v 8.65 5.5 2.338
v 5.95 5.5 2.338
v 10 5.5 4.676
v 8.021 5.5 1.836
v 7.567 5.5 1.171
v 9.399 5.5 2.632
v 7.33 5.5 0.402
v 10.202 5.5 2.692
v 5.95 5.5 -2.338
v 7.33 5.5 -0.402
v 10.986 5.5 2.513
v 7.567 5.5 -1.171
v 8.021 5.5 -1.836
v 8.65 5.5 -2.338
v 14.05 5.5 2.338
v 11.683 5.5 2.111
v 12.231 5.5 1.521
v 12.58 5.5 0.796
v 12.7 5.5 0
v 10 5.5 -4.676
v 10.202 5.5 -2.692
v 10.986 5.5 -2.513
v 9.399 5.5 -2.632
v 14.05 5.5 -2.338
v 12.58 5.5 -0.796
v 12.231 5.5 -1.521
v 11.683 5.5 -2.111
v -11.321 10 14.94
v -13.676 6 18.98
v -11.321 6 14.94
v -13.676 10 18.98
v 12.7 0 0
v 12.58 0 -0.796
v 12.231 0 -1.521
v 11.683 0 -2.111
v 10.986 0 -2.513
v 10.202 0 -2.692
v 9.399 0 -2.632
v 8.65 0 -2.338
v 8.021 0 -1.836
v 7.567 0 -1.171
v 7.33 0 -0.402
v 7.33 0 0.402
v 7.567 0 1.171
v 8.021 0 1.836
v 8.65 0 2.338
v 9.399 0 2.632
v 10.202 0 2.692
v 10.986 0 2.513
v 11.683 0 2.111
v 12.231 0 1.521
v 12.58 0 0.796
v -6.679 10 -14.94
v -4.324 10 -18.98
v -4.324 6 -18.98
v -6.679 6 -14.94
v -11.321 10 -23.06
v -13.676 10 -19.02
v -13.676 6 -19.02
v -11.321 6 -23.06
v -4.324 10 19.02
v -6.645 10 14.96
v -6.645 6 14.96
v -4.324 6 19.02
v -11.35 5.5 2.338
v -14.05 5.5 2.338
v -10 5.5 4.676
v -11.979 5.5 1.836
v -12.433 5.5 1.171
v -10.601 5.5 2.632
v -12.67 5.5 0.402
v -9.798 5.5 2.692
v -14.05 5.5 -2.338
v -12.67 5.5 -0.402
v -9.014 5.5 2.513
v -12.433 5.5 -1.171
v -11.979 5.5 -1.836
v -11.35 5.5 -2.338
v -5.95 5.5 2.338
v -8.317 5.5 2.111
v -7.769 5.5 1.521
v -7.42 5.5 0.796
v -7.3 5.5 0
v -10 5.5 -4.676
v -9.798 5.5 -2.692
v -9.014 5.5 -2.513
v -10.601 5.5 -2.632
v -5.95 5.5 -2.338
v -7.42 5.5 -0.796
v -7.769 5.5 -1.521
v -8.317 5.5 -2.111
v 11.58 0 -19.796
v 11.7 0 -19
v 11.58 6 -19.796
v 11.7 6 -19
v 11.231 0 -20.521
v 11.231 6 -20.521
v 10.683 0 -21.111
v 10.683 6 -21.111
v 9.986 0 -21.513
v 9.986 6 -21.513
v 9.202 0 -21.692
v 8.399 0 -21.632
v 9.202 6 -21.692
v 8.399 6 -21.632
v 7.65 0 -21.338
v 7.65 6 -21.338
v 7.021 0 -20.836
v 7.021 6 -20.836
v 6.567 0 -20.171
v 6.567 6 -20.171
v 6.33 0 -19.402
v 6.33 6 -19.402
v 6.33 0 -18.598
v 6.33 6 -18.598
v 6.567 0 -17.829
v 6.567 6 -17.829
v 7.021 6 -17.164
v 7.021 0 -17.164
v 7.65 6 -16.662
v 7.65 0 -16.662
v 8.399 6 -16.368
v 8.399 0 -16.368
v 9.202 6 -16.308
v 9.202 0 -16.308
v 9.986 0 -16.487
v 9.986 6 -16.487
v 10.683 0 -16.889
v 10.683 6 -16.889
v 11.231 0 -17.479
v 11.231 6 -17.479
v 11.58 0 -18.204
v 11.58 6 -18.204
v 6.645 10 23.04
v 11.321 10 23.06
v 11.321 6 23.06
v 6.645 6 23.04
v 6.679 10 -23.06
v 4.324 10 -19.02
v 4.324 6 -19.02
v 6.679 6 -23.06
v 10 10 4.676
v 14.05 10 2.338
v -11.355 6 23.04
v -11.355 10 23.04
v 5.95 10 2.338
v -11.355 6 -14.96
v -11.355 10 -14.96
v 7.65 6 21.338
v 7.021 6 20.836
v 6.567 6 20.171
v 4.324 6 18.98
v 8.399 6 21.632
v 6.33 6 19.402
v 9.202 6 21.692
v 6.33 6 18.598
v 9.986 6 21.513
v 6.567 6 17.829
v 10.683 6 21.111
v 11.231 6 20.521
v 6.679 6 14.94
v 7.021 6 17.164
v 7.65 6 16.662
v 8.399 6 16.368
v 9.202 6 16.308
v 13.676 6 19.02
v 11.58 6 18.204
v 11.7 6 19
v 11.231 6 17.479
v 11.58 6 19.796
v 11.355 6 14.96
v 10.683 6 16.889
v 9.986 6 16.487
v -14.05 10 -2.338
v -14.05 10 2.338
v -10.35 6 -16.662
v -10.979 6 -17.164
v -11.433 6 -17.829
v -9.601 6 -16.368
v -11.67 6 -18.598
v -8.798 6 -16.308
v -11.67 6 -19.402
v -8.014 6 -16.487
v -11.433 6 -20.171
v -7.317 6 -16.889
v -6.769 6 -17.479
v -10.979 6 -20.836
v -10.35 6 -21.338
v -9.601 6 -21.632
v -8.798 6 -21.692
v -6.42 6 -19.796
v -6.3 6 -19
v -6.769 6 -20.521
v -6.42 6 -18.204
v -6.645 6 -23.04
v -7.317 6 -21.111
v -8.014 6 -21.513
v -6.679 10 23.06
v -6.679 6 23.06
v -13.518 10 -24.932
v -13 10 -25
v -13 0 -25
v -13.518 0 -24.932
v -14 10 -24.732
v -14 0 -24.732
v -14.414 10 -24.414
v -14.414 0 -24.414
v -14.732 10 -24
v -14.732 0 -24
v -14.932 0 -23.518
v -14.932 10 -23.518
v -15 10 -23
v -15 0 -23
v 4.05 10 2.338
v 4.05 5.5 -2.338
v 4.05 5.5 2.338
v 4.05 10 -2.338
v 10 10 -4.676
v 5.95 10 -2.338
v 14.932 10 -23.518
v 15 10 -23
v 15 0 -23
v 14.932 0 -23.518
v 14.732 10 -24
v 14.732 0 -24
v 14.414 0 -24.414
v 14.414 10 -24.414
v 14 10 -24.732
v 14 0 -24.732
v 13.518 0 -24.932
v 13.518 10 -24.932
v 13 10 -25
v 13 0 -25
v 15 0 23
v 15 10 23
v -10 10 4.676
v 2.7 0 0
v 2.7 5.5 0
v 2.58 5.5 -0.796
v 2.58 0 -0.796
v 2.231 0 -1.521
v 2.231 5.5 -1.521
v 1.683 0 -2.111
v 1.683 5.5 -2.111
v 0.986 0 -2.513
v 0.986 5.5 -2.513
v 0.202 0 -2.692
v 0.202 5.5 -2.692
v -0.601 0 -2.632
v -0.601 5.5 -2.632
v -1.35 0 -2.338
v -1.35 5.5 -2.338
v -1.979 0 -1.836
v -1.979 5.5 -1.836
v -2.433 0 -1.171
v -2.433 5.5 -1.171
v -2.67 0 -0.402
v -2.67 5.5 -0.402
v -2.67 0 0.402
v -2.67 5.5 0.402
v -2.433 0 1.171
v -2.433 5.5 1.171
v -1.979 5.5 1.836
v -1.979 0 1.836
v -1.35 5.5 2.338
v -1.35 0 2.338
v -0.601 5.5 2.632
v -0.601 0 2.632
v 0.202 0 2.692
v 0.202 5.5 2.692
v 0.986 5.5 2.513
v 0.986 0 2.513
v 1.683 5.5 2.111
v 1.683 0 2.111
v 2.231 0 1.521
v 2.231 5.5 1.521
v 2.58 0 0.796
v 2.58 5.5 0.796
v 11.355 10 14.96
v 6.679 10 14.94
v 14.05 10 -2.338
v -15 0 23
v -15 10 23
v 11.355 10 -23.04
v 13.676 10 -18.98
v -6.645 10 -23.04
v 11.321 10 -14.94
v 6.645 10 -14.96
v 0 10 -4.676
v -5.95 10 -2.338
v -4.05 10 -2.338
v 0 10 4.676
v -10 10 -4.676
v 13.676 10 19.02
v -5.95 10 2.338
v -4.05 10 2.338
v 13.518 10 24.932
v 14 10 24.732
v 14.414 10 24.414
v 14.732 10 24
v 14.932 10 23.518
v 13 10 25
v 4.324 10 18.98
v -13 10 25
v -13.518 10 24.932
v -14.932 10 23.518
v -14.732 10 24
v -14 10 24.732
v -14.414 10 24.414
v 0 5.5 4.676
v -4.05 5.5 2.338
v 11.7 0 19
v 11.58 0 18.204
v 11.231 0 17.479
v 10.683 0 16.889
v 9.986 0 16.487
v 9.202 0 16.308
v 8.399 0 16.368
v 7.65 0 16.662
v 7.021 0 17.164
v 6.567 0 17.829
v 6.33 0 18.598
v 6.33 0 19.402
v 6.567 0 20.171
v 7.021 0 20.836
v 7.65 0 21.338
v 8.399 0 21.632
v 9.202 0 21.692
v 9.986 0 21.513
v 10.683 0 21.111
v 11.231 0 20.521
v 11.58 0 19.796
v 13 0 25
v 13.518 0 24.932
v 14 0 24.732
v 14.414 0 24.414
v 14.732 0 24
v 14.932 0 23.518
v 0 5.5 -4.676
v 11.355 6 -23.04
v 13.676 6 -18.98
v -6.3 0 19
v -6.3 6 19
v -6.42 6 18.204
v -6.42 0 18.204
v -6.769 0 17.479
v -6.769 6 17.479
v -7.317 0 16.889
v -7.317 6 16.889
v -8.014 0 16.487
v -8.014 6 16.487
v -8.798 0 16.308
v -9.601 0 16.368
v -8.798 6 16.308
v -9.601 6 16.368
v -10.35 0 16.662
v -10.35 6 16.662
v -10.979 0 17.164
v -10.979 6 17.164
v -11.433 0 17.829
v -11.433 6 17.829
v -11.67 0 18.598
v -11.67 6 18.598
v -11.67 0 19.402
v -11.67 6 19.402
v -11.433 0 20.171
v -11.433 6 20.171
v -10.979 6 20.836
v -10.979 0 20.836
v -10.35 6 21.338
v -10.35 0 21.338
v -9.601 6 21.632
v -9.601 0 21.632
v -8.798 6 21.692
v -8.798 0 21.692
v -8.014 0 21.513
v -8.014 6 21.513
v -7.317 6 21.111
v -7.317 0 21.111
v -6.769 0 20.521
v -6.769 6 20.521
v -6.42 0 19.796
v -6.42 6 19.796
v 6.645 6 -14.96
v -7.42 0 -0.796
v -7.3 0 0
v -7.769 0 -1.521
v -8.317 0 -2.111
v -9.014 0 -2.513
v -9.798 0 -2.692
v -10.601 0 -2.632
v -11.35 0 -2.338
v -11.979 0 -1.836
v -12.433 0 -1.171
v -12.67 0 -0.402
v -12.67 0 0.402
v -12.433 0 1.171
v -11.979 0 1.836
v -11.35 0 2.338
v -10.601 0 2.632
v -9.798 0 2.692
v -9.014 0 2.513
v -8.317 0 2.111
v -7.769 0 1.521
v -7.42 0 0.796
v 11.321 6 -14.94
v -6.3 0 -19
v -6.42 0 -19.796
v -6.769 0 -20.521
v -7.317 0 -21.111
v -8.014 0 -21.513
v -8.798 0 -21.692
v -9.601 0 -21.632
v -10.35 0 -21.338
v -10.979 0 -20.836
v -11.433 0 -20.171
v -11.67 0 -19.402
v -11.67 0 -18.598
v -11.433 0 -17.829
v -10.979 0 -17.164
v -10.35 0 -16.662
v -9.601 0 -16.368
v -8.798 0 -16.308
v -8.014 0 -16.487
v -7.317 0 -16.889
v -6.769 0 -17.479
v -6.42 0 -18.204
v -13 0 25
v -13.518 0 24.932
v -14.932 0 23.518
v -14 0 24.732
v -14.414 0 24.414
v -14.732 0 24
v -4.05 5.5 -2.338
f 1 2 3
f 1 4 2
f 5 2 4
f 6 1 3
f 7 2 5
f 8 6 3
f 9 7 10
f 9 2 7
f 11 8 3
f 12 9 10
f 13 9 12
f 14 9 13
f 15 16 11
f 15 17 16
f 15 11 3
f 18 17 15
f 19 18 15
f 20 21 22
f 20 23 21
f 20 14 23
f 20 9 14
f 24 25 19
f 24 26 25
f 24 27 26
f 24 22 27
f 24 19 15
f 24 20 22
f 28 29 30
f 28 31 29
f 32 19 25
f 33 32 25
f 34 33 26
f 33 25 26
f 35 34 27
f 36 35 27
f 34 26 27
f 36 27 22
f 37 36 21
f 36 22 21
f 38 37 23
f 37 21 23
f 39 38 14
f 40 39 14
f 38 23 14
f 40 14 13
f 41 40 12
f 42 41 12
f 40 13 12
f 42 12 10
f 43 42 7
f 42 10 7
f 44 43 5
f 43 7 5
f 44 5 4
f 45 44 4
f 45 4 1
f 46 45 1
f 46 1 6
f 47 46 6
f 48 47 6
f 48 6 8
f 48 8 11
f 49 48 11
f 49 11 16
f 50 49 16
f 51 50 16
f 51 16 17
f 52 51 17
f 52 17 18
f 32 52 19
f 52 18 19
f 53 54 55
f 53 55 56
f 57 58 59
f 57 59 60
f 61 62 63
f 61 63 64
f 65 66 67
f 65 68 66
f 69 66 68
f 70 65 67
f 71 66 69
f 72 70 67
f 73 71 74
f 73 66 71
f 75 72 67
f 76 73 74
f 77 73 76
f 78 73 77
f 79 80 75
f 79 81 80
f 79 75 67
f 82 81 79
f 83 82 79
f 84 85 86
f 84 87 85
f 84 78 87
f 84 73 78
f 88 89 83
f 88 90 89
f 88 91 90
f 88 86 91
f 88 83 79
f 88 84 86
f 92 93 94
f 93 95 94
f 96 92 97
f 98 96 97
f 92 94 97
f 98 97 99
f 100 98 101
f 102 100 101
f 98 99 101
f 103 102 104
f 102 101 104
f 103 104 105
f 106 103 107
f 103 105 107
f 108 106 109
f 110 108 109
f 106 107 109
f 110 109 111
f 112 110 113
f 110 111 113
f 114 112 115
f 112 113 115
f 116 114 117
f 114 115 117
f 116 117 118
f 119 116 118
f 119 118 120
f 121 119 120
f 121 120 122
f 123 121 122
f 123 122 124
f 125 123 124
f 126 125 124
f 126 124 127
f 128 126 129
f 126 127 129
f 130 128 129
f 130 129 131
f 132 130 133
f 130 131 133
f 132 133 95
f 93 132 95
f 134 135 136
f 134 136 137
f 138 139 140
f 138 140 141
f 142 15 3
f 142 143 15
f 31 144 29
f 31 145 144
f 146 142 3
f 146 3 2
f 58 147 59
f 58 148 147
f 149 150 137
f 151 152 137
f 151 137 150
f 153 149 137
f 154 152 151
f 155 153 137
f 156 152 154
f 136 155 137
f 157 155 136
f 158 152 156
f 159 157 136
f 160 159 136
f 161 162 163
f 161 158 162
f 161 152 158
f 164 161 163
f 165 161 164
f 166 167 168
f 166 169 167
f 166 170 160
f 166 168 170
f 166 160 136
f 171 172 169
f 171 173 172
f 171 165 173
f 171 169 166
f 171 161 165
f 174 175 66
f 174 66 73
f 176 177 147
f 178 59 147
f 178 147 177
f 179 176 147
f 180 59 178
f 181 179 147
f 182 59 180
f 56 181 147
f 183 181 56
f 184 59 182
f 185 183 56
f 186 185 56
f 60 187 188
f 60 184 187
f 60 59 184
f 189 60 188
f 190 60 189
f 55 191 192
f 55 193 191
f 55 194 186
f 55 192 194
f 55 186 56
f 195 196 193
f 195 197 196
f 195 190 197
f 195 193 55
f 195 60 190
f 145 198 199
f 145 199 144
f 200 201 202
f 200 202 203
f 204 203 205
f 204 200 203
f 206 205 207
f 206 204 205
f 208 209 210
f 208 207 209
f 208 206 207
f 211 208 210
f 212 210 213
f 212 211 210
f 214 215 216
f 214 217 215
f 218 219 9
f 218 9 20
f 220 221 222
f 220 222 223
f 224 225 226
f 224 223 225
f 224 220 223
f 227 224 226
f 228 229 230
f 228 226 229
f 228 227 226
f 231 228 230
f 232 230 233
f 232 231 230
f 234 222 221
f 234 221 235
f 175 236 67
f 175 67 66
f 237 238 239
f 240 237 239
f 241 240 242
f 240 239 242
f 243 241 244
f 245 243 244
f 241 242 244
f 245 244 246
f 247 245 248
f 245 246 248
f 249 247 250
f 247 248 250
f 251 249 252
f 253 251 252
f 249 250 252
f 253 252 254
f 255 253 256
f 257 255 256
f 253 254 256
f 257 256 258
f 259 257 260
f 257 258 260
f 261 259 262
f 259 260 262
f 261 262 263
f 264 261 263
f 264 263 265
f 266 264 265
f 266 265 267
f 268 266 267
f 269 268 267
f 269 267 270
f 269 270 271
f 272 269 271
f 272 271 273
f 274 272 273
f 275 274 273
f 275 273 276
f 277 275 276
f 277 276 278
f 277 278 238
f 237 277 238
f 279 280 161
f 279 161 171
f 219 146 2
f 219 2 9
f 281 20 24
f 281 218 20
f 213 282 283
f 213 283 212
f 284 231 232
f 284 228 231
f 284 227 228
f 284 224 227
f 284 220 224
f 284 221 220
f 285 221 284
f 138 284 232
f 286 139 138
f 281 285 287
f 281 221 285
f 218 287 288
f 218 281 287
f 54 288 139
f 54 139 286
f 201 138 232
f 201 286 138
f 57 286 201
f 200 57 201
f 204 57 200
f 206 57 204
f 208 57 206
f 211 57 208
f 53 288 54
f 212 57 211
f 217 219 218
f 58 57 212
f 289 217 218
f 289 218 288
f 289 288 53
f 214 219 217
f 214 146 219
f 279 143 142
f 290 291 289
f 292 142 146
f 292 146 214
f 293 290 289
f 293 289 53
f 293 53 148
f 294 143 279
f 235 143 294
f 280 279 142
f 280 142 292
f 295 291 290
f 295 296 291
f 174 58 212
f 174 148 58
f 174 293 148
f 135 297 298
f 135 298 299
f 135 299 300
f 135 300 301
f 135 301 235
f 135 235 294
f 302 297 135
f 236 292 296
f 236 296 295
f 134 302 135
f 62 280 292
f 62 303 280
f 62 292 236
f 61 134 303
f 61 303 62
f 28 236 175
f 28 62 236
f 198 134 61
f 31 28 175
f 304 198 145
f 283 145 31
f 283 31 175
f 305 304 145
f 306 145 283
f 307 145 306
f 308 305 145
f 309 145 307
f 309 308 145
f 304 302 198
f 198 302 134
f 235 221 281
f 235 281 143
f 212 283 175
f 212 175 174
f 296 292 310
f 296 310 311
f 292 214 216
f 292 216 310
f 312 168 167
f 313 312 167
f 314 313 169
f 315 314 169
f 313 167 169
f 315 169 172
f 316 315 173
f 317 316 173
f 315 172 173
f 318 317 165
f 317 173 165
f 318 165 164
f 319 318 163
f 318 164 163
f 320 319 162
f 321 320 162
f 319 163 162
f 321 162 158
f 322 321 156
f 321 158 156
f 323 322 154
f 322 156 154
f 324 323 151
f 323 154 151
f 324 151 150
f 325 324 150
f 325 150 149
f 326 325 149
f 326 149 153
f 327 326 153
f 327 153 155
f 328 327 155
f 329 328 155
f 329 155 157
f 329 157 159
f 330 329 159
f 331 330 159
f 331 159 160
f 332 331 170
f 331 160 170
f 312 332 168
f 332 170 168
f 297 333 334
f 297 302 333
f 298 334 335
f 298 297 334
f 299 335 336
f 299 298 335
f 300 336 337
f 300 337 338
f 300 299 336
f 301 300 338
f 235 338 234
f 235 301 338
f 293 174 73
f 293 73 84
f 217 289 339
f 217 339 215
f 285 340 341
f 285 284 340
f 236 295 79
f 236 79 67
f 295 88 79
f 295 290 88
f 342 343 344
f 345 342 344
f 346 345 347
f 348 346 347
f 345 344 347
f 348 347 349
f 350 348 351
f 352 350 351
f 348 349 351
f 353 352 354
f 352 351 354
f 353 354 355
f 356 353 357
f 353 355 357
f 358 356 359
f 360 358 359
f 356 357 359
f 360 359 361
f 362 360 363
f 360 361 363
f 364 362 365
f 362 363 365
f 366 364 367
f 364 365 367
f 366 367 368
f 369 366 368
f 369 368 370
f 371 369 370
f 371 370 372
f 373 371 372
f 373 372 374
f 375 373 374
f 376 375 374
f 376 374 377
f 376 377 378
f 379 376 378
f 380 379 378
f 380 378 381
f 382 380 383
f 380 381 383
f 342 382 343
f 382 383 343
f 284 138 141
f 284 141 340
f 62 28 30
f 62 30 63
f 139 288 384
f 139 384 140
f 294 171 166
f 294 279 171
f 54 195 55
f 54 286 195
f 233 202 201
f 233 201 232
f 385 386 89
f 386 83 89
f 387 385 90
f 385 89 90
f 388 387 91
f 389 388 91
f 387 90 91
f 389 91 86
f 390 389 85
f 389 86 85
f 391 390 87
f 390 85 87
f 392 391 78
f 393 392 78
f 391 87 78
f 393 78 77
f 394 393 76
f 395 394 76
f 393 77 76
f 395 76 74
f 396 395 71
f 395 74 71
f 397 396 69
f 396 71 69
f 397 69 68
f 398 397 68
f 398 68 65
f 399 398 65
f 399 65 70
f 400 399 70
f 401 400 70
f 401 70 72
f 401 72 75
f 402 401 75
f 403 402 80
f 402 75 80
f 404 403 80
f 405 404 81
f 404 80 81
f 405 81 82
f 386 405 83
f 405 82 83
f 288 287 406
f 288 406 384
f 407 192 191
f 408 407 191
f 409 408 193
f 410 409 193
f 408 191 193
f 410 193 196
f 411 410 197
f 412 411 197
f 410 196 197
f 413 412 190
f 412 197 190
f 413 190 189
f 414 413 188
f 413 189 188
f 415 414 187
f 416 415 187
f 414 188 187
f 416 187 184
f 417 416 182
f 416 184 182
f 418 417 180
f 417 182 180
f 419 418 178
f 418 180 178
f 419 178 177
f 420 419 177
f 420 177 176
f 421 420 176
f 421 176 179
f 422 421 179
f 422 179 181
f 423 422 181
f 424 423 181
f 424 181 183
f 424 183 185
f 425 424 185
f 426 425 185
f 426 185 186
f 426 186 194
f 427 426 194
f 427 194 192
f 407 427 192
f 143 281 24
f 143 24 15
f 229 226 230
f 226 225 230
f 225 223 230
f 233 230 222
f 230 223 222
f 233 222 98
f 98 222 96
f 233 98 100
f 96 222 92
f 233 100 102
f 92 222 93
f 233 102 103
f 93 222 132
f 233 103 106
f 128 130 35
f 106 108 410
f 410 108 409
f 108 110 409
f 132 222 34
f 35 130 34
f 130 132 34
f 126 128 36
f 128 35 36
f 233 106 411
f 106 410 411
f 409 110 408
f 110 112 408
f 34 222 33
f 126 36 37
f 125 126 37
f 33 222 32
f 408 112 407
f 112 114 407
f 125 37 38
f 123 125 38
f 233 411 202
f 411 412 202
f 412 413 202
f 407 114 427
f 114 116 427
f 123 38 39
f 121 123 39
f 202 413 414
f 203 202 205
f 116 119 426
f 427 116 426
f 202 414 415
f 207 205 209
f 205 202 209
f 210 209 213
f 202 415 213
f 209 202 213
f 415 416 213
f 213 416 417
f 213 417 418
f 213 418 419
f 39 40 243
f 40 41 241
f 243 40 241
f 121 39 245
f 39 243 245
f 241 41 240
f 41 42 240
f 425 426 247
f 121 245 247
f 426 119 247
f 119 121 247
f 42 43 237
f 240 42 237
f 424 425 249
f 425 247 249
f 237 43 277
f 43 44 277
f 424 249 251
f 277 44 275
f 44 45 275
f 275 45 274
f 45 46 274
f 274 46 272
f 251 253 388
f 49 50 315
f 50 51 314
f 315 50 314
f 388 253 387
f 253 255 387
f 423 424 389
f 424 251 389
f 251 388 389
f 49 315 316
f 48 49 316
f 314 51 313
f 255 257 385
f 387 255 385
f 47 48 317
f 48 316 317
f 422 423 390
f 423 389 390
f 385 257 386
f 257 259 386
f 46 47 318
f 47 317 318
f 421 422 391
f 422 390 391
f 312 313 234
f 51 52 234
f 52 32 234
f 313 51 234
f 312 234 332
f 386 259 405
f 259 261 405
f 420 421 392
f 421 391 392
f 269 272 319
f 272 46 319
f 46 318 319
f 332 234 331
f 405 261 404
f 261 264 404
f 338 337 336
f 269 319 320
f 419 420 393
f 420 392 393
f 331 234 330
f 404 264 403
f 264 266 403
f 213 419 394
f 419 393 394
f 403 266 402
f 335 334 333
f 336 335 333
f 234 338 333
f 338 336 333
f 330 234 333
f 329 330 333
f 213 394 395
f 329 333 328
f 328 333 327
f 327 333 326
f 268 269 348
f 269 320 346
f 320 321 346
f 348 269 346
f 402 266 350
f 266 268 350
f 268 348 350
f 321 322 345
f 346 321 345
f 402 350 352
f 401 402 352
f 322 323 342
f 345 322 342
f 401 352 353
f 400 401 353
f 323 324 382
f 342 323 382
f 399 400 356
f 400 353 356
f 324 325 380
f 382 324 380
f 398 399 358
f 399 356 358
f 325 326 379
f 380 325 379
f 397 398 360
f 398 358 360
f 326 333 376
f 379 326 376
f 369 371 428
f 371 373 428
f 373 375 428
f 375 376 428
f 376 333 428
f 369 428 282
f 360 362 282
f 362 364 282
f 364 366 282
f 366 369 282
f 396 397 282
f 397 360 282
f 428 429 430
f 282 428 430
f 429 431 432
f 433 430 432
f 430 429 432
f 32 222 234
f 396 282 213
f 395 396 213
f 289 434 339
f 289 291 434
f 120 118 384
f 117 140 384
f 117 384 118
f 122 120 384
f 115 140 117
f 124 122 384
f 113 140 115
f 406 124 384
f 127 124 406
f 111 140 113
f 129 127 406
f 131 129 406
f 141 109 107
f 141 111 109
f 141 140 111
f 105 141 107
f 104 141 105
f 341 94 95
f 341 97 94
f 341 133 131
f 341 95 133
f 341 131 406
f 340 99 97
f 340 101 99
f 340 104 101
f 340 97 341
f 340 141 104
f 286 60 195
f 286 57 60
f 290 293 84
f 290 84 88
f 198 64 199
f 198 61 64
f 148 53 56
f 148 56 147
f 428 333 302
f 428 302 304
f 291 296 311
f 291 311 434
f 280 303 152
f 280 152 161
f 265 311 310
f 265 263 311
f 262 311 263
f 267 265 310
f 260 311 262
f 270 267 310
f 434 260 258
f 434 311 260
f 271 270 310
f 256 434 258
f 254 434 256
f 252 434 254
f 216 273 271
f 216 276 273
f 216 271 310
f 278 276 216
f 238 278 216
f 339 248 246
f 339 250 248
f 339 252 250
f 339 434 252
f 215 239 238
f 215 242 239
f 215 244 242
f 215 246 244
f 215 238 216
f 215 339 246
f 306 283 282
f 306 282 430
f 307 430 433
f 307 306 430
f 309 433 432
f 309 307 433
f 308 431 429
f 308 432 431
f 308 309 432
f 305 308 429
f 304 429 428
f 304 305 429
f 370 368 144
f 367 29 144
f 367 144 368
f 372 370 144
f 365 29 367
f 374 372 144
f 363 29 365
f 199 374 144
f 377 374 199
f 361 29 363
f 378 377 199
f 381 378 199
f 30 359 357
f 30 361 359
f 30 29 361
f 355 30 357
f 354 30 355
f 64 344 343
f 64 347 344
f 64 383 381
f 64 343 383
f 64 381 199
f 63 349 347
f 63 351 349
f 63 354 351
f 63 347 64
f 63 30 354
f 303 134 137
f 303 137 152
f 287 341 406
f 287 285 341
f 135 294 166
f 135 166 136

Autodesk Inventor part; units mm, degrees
ref_plane "YZ Plane" through (0, 0, 0) normal (1, 0, 0) x (0, 1, 0)
ref_plane "XZ Plane" through (0, 0, 0) normal (0, 1, 0) x (-1, 0, 0)
ref_plane "XY Plane" through (0, 0, 0) normal (0, 0, 1) x (1, 0, 0)
sketch "Boceto1" plane through (0, 0, 0) normal (0, 1, 0) x (-1, 0, 0)
  line L0 (-15, 25) -> (15, 25)
  line L1 (15, 25) -> (15, -25)
  line L2 (15, -25) -> (-15, -25)
  line L3 (-15, -25) -> (-15, 25)
  line L4 (-15, 25) -> (15, -25) construction
  line L5 (15, 25) -> (-15, -25) construction
  point P0 (0, 0)
  dimension "d0" = 30
  dimension "d1" = 50
extrude "Extrusión1" add sketch "Boceto1" along normal blind 10
fillet "Empalme1" radius 2 4 edges at (-15, 5, -25) (-15, 5, 25) (15, 5, -25) (15, 5, 25)
sketch "Boceto2" plane through (0, 10, 0) normal (0, 1, 0) x (1, 0, 0)
  circle A0 centre (-10, 0) radius 2.7
  circle A1 centre (0, 0) radius 2.7
  circle A2 centre (10, 0) radius 2.7
  dimension "d5" = 5.4
  dimension "d6" = 10
  dimension "d7" = 10
extrude "Extrusión2" cut sketch "Boceto2" against normal through all
sketch "Boceto3" plane through (0, 10, 0) normal (0, 1, 0) x (1, 0, 0)
  circle A0 centre (-9, -19) radius 2.7
  circle A1 centre (9, -19) radius 2.7
  circle A2 centre (-9, 19) radius 2.7
  circle A3 centre (9, 19) radius 2.7
  line L0 (-13, -25) -> (13, -25) projected
  line L1 (-15, 23) -> (-15, -23) projected
  line L2 (15, -23) -> (15, 23) projected
  line L3 (13, 25) -> (-13, 25) projected
  point P0 (0, 0)
  dimension "d10" = 5.4
  dimension "d11" = 6
  dimension "d12" = 6
  dimension "d13" = 6
  dimension "d14" = 6
extrude "Extrusión3" cut sketch "Boceto3" against normal through all
sketch "Boceto4" plane through (0, 10, 0) normal (0, 1, 0) x (1, 0, 0)
  circle A0 centre (-10, 0) radius 2.7 projected
  circle A1 centre (-10, 0) radius 4.05
  circle A2 centre (0, 0) radius 2.7 projected
  circle A3 centre (0, 0) radius 4.05
  circle A4 centre (10, 0) radius 2.7 projected
  circle A5 centre (10, 0) radius 4.05
  line L0 (-10, 4.6765) -> (-5.95, 2.3383)
  line L1 (-5.95, 2.3383) -> (-5.95, -2.3383)
  line L2 (-5.95, -2.3383) -> (-10, -4.6765)
  line L3 (-10, -4.6765) -> (-14.05, -2.3383)
  line L4 (-14.05, -2.3383) -> (-14.05, 2.3383)
  line L5 (-14.05, 2.3383) -> (-10, 4.6765)
  line L6 (0, 4.6765) -> (4.05, 2.3383)
  line L7 (4.05, 2.3383) -> (4.05, -2.3383)
  line L8 (4.05, -2.3383) -> (0, -4.6765)
  line L9 (0, -4.6765) -> (-4.05, -2.3383)
  line L10 (-4.05, -2.3383) -> (-4.05, 2.3383)
  line L11 (-4.05, 2.3383) -> (0, 4.6765)
  line L12 (10, 4.6765) -> (14.05, 2.3383)
  line L13 (14.05, 2.3383) -> (14.05, -2.3383)
  line L14 (14.05, -2.3383) -> (10, -4.6765)
  line L15 (10, -4.6765) -> (5.95, -2.3383)
  line L16 (5.95, -2.3383) -> (5.95, 2.3383)
  line L17 (5.95, 2.3383) -> (10, 4.6765)
  dimension "d17" = 8.1
extrude "Extrusión4" cut sketch "Boceto4" against normal blind 4.5 contours A0 | A1 | L1 L2 A1 | A1 L0 L1 | A1 L5 L0 | L2 L3 A1 | A1 L4 L5 | L3 L4 A1 | A2 | A3 | L7 L8 A3 | A3 L6 L7 | A3 L11 L6 | L8 L9 A3 | A3 L10 L11 | L9 L10 A3 | A4 | A5 | L13 L14 A5 | A5 L12 L13 | A5 L17 L12 | L14 L15 A5 | A5 L16 L17 | L15 L16 A5
sketch "Boceto5" plane through (0, 10, 0) normal (0, 1, 0) x (1, 0, 0)
  circle A0 centre (-9, -19) radius 2.7 projected
  circle A1 centre (-9, -19) radius 4.05
  line L0 (-13.6765, -18.9802) -> (-11.3211, -14.9401)
  line L1 (-11.3211, -14.9401) -> (-6.6446, -14.96)
  line L2 (-6.6446, -14.96) -> (-4.3235, -19.0198)
  line L3 (-4.3235, -19.0198) -> (-6.6789, -23.0599)
  line L4 (-6.6789, -23.0599) -> (-11.3554, -23.04)
  line L5 (-11.3554, -23.04) -> (-13.6765, -18.9802)
  point P0 (0, 0)
  dimension "d20" = 8.1
extrude "Extrusión5" cut sketch "Boceto5" against normal blind 4 contours A0 | A1 | A1 L2 L3 | A1 L1 L2 | L3 L4 A1 | A1 L0 L1 | L4 L5 A1 | A1 L5 L0
pattern_linear "Patrón rectangular1" count 2 spacing 38 along (0, 0, -1) count 2 spacing 18 along (1, 0, 0) of "Extrusión5"
properties part number "ViseA"
